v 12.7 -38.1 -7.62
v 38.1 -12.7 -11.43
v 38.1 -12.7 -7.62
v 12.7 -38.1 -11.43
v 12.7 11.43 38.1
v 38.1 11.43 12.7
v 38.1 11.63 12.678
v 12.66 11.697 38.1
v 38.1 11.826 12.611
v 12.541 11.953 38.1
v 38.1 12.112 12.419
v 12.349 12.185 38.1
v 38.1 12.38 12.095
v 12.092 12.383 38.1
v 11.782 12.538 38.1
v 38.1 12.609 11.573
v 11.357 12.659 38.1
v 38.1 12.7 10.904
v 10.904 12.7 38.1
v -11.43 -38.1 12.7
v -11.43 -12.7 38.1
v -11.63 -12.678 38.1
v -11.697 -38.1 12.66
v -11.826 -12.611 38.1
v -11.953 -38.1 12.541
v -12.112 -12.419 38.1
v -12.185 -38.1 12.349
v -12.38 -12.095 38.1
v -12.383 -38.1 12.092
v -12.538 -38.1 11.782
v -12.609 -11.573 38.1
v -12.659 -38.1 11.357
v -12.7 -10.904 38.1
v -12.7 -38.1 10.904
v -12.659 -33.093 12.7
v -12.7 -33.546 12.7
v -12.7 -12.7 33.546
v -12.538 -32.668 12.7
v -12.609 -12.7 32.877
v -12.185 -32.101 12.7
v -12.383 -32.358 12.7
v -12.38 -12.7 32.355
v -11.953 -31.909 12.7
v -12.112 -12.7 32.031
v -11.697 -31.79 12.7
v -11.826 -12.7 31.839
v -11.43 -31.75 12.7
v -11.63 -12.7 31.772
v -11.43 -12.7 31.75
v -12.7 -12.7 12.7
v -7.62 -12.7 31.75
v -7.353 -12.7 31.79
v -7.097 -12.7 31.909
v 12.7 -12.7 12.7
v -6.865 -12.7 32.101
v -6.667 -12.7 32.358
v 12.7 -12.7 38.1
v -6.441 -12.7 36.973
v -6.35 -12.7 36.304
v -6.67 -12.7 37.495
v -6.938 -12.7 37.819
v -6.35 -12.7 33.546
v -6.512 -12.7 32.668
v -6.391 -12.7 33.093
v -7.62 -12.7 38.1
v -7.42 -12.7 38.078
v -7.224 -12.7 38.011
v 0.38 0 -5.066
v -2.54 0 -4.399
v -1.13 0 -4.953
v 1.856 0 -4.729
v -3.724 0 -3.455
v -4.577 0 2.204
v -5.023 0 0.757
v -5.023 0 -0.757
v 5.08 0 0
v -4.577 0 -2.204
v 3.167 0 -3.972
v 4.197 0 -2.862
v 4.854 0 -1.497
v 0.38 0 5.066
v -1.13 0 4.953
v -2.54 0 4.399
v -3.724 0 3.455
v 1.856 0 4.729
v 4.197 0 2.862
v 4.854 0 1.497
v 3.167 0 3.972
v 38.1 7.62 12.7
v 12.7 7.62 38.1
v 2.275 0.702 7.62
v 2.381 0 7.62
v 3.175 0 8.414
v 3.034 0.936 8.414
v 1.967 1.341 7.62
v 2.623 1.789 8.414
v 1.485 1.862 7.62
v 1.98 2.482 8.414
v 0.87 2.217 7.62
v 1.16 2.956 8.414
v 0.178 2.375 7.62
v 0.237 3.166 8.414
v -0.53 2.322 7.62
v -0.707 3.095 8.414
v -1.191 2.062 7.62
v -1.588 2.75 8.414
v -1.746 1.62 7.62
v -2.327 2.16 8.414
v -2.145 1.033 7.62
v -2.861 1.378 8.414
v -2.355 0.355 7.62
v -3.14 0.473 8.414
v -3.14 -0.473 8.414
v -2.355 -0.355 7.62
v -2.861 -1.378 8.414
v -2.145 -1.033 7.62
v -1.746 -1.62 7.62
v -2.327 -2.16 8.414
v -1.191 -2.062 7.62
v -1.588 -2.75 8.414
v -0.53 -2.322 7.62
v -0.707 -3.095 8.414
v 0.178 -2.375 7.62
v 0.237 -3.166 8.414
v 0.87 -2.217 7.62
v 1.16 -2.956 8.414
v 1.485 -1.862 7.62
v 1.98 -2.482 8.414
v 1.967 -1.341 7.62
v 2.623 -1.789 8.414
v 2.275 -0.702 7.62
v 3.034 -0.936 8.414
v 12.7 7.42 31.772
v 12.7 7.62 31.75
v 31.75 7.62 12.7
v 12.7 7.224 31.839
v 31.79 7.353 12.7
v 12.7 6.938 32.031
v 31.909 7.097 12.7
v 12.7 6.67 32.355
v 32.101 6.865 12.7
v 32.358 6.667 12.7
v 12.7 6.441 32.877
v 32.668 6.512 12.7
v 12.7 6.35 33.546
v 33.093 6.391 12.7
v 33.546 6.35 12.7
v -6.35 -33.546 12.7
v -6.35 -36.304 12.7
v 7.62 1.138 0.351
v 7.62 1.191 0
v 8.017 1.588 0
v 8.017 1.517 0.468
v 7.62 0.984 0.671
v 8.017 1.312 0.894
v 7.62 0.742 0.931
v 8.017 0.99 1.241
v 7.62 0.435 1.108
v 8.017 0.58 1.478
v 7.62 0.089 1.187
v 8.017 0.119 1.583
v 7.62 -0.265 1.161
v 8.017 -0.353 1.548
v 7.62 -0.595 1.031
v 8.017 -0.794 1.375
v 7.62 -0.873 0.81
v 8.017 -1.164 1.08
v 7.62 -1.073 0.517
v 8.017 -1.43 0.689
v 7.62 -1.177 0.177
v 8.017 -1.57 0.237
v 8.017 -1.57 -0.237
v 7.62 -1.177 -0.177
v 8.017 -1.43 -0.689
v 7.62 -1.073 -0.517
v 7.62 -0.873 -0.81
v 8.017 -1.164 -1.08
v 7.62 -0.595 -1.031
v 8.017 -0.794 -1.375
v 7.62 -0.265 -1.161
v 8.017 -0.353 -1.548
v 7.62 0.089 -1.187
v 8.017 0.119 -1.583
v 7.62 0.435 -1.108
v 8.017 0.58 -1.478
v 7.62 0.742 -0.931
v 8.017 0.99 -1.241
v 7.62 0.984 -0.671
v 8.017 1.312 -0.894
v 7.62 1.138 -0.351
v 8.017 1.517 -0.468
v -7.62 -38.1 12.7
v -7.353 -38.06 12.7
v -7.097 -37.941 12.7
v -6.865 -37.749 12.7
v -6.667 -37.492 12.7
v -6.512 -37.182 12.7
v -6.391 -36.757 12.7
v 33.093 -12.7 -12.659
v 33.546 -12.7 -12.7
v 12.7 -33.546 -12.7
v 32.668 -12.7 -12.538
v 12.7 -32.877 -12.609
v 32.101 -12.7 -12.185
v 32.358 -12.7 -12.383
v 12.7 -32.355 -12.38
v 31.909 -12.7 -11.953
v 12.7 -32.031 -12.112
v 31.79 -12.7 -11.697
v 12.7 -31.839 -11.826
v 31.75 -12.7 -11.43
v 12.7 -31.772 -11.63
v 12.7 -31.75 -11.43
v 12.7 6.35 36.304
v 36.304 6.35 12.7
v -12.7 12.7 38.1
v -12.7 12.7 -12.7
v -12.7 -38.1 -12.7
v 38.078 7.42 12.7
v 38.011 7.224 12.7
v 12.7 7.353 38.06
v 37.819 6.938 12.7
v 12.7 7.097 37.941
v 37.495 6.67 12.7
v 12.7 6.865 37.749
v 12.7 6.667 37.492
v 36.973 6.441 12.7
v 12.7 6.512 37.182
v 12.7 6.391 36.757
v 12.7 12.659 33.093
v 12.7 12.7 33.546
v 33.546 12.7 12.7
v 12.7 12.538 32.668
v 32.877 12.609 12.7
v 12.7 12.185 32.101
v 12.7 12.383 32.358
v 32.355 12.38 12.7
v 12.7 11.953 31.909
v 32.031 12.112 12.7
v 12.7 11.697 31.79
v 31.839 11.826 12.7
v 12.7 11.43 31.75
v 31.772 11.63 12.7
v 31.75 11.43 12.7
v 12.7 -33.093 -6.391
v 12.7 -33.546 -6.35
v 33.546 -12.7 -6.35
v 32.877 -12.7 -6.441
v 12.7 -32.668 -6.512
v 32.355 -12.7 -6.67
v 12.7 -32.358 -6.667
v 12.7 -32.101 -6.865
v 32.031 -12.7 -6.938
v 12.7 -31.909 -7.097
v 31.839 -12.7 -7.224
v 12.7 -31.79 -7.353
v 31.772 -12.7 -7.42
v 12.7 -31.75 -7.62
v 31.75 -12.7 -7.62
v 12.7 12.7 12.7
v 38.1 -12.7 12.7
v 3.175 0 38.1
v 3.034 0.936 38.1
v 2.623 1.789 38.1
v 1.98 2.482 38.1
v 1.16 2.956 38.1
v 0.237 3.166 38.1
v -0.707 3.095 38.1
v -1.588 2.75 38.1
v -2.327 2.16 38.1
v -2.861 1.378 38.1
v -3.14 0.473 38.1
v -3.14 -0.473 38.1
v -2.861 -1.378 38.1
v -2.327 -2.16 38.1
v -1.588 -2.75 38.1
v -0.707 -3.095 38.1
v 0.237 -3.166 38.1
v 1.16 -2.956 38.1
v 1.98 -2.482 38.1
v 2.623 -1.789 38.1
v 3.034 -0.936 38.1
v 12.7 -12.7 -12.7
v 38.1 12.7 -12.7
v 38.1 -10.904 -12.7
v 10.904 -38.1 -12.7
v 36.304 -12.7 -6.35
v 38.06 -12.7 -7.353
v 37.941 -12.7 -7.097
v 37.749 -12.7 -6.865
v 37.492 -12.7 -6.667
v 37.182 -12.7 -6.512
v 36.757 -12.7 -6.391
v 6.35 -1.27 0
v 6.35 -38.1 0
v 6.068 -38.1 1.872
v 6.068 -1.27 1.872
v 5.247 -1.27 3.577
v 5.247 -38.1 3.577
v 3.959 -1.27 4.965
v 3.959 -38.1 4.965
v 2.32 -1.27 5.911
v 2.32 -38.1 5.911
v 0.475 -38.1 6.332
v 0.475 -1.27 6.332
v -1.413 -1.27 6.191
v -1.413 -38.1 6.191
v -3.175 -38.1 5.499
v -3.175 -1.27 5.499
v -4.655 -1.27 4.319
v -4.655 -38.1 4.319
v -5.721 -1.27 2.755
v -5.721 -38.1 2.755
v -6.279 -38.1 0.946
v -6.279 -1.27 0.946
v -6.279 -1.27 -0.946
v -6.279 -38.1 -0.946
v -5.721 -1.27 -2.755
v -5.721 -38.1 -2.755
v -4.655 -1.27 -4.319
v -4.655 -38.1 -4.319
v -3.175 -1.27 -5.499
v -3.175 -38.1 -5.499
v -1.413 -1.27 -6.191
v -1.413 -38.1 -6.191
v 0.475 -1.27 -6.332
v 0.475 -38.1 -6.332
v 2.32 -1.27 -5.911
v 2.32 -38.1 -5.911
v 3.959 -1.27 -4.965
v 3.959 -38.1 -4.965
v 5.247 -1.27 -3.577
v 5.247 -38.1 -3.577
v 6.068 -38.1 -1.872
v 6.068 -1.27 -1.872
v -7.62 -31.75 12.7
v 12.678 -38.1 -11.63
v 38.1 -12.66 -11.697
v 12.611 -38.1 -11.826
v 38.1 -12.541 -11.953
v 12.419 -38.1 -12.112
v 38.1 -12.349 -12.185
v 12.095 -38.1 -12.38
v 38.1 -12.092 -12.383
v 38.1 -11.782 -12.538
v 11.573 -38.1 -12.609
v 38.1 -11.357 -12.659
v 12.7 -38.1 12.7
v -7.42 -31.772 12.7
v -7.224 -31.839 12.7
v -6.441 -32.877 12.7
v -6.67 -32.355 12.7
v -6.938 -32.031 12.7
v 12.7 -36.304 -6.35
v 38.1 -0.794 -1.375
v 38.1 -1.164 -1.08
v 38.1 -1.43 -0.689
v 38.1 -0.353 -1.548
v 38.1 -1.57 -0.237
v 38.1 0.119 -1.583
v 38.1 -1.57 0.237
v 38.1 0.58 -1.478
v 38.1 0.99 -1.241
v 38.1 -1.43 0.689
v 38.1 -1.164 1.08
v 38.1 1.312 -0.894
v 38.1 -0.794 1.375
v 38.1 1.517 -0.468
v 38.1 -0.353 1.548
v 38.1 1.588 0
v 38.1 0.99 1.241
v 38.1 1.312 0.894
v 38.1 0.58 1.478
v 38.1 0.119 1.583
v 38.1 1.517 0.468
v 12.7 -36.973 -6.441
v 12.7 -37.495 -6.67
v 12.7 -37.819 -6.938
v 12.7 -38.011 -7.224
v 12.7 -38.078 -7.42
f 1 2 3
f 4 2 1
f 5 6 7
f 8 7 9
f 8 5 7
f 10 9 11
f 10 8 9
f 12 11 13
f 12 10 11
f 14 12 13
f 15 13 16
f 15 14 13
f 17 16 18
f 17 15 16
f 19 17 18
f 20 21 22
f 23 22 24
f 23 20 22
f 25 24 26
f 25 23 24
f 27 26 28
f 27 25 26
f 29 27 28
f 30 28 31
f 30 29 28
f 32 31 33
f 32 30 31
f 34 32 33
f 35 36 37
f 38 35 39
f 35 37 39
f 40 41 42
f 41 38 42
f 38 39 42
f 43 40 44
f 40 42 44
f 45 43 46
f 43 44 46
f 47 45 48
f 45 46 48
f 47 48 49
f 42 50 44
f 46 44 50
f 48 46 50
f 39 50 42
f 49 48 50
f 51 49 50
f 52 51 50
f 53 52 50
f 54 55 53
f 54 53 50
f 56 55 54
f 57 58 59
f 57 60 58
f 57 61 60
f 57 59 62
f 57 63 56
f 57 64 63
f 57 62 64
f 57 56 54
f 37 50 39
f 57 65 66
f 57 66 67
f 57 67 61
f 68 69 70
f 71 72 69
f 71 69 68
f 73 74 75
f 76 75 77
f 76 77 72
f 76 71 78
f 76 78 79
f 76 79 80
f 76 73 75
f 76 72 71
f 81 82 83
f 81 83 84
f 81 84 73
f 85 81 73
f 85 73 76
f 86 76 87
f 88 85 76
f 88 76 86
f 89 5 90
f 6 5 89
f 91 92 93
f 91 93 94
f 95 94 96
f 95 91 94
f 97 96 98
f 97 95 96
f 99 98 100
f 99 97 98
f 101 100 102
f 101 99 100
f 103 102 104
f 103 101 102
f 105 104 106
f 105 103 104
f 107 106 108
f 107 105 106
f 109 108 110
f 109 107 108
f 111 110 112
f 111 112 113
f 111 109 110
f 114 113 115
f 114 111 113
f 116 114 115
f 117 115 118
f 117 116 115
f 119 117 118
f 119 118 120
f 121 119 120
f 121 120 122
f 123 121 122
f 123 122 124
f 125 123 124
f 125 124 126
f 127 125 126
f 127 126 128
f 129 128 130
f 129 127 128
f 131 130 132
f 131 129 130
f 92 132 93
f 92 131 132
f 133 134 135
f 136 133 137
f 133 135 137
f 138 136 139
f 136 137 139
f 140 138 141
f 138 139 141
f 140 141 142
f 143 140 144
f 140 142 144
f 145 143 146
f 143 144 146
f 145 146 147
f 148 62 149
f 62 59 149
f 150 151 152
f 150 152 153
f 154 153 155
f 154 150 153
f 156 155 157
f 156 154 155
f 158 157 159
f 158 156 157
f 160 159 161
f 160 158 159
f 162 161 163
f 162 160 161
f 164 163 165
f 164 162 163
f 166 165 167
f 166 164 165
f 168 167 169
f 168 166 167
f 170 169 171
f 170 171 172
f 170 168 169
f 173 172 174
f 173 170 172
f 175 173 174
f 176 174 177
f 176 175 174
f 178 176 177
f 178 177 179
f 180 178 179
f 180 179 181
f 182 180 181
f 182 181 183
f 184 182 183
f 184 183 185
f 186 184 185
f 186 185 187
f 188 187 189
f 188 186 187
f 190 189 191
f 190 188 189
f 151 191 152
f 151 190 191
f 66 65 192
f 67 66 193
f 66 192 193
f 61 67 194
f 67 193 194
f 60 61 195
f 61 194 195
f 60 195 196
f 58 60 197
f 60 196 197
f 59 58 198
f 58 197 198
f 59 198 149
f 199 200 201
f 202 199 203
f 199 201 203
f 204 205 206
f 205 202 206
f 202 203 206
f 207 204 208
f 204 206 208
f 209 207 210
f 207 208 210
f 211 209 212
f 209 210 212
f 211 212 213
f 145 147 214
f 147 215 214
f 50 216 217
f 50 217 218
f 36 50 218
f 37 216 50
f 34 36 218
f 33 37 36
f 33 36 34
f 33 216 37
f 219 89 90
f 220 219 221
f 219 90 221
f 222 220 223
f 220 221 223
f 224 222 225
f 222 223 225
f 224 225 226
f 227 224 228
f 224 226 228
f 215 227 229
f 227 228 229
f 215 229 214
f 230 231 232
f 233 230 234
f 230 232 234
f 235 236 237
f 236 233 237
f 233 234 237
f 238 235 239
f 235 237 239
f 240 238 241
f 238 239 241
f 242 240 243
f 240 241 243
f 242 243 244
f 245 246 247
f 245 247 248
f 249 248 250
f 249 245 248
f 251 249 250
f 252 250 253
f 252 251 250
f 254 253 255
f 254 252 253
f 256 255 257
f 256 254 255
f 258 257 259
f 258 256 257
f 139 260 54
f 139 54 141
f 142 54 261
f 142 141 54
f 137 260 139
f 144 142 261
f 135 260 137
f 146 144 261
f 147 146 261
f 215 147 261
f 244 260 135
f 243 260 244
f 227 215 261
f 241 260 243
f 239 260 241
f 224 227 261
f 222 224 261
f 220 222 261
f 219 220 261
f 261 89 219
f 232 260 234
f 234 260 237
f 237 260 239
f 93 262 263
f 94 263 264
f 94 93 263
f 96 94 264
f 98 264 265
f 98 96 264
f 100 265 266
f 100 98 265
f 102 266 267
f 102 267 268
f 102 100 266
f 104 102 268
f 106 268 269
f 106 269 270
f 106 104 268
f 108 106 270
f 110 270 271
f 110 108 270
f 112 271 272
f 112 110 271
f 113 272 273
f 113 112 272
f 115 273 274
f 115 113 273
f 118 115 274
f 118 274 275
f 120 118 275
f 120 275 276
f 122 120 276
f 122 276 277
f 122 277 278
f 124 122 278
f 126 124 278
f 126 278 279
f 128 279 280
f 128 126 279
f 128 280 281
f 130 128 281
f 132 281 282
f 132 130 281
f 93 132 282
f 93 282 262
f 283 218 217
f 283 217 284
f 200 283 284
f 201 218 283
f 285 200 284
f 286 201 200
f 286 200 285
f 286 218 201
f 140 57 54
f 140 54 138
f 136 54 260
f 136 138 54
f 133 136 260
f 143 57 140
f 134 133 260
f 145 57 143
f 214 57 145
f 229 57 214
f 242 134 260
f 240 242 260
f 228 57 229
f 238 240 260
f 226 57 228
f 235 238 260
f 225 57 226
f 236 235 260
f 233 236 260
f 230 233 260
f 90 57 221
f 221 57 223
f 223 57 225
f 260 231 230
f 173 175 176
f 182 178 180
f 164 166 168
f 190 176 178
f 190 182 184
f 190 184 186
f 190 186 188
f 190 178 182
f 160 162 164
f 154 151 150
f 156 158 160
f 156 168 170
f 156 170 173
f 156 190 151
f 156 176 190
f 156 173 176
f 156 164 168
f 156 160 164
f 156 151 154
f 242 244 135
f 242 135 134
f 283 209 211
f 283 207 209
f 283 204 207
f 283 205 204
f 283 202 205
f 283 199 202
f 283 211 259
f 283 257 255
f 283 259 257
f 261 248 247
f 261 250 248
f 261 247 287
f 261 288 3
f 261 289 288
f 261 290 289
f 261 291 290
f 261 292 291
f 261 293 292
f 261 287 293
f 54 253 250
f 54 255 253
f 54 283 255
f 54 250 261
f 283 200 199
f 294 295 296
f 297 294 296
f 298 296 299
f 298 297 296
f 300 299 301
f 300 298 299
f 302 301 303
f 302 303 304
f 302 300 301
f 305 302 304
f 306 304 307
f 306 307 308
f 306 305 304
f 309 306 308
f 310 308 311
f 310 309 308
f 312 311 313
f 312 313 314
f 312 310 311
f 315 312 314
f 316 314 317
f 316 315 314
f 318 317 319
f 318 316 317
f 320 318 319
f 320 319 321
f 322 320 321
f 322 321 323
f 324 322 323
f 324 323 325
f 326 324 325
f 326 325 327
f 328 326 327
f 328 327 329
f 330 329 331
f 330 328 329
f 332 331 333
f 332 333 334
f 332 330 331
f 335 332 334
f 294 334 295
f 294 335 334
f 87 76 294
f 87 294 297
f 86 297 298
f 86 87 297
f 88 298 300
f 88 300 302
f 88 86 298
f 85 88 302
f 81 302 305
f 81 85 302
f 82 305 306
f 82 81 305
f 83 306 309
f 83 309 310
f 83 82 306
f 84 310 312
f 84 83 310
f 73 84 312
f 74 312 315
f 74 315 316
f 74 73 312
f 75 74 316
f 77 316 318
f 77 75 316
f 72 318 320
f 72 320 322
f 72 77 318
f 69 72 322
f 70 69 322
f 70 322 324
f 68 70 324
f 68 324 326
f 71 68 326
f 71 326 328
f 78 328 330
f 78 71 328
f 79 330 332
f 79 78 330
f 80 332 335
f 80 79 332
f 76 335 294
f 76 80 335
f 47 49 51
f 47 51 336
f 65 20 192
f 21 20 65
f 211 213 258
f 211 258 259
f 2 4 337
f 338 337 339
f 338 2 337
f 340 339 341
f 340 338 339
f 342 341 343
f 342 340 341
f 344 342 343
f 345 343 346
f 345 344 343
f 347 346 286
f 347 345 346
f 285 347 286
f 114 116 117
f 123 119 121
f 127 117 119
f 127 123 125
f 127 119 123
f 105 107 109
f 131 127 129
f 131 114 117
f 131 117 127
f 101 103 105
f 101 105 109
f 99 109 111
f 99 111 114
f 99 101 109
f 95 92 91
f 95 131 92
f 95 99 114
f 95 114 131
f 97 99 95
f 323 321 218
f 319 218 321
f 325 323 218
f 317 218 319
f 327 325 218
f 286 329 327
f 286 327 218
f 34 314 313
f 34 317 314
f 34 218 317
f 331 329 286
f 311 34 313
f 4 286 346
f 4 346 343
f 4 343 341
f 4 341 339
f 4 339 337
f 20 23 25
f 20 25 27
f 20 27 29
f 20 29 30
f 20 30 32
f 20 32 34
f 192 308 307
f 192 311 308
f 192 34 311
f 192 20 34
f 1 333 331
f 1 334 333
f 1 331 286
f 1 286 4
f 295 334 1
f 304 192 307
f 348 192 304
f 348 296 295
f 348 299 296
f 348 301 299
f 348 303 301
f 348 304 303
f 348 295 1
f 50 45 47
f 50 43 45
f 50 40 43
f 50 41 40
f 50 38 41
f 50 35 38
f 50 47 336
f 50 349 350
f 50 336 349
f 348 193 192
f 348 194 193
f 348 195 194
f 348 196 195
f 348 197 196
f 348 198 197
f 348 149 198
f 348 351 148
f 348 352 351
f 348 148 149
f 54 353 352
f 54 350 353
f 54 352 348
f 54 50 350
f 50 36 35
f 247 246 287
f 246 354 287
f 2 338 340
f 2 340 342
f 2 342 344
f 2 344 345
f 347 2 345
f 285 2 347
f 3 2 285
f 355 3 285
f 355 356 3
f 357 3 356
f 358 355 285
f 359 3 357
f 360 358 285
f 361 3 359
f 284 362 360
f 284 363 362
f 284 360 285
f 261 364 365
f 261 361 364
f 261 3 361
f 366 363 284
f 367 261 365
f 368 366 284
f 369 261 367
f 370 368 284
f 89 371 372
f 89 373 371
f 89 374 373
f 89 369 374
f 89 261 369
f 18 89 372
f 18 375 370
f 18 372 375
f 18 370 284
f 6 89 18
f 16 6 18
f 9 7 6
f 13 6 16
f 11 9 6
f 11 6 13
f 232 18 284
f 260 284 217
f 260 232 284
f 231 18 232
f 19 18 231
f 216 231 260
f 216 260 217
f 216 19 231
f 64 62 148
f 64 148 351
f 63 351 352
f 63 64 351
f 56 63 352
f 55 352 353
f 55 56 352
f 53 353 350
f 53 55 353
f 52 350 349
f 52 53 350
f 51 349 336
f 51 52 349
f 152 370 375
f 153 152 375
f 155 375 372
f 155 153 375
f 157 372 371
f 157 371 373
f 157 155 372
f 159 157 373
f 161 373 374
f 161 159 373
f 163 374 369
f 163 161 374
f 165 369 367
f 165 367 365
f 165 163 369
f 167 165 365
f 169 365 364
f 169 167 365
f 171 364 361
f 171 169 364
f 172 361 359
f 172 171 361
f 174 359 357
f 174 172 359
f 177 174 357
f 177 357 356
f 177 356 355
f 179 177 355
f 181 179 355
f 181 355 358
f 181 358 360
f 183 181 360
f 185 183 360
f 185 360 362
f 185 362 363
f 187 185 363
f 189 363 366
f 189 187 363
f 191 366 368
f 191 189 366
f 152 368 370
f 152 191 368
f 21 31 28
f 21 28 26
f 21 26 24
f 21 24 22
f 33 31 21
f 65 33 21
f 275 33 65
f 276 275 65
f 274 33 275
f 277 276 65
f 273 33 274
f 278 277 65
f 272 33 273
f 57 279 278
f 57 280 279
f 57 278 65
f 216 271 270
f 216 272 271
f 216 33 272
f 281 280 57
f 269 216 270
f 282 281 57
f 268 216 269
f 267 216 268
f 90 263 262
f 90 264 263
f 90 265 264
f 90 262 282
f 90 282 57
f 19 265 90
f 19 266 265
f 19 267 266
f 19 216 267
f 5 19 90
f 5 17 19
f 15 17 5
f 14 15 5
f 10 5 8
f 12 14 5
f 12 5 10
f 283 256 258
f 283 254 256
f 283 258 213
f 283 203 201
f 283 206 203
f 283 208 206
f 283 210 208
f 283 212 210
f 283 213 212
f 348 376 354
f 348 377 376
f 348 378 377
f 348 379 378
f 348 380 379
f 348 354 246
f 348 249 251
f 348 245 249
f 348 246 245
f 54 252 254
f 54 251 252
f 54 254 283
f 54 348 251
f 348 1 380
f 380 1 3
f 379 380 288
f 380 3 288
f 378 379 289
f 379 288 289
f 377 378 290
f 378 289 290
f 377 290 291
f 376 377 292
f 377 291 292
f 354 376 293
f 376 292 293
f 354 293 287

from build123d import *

# Parameters (mm, degrees)
F0_W          = 25.4
F0_H          = 25.4
F1_DEPTH      = 12.7
F2_R          = 3.175
F3_DEPTH      = 5.08
F4_R          = 1.5875
F5_DEPTH      = 5.08
F6_R          = 6.35
F7_DEPTH      = 12.7
F8_SIZE       = 1.27
F9_SIZE       = 0.396875
F10_SIZE      = 0.79375
F11_W         = 25.4
F11_H         = 25.4
F11_R         = 1.5875
F12_DEPTH     = 25.4
F13_W         = 25.4
F13_H         = 25.4
F13_R         = 6.35
F14_DEPTH     = 25.4
F15_W         = 25.4
F15_H         = 25.4
F15_R         = 3.175
F16_DEPTH     = 25.4
F18_DEPTH     = 6.35
F20_DEPTH     = 6.35
F22_DEPTH     = 6.35
F23_T1_DEPTH  = 42.2710244843
F23_T3_DEPTH  = 42.2710244843
F23_T5_DEPTH  = 42.2710244843
F23_T10_DEPTH = 42.2710244843
F23_T16_DEPTH = 33.2907683632
F23_T22_DEPTH = 33.2907683632
F23_T28_DEPTH = 42.2710244843
F23_T34_DEPTH = 33.2907683632
F23_T40_DEPTH = 33.2907683632
F23_T46_DEPTH = 42.2710244843
F23_T52_DEPTH = 33.2907683632
F23_T58_DEPTH = 33.2907683632


# Not quite as in the source:
# - a fillet or chamfer that OpenCascade refuses, or shapes differently, is made with other operations: its cross-section is extruded or revolved along the edge and cut away or added


with BuildPart() as f1:
    # F0 (on Top) → F1 (new body, symmetric)
    with BuildSketch(Plane.XY):
        Rectangle(F0_W, F0_H)
    extrude(amount=F1_DEPTH, both=True)

    # F2 (on face) → F3 (cut)
    with BuildSketch(Plane.XY.offset(12.7)):
        Circle(F2_R)
    extrude(amount=-F3_DEPTH, mode=Mode.SUBTRACT)

    # F4 (on face) → F5 (cut)
    with BuildSketch(Plane.YZ.offset(12.7)):
        Circle(F4_R)
    extrude(amount=-F5_DEPTH, mode=Mode.SUBTRACT)

    # F6 (on face) → F7 (cut)
    with BuildSketch(Plane.XZ.offset(12.7)):
        Circle(F6_R)
    extrude(amount=-F7_DEPTH, mode=Mode.SUBTRACT)

    # F8
    f8_edges = [f1.edges().sort_by_distance(p)[0] for p in [
        (-6.35, 0, 0),
    ]]
    chamfer(f8_edges, length=F8_SIZE)

    # F9
    f9_edges = [f1.edges().sort_by_distance(p)[0] for p in [
        (7.62, -1.5875, 0),
    ]]
    chamfer(f9_edges, length=F9_SIZE)

    # F10
    f10_edges = [f1.edges().sort_by_distance(p)[0] for p in [
        (-3.175, 0, 7.62),
    ]]
    chamfer(f10_edges, length=F10_SIZE)

    # F11 (on face) → F12 (join)
    with BuildSketch(Plane.YZ.offset(12.7)):
        Rectangle(F11_W, F11_H)
        Circle(F11_R, mode=Mode.SUBTRACT)
    extrude(amount=F12_DEPTH)

    # F13 (on face) → F14 (join)
    with BuildSketch(Plane.XZ.offset(12.7)):
        Rectangle(F13_W, F13_H)
        Circle(F13_R, mode=Mode.SUBTRACT)
    extrude(amount=F14_DEPTH)

    # F15 (on face) → F16 (join)
    with BuildSketch(Plane.XY.offset(12.7)):
        Rectangle(F15_W, F15_H)
        Circle(F15_R, mode=Mode.SUBTRACT)
    extrude(amount=F16_DEPTH)

    # F17 (on face) → F18 (join)
    with BuildSketch(Plane(origin=(0, 0, -12.7), x_dir=(1, 0, 0), z_dir=(0, 0, -1))):
        Polygon((38.1, 12.7), (12.7, 38.1), (12.7, 31.75), (31.75, 12.7), align=None)
    extrude(amount=-F18_DEPTH)

    # F19 (on face) → F20 (join)
    with BuildSketch(Plane(origin=(0, 12.7, 0), x_dir=(-1, 0, 0), z_dir=(0, 1, 0))):
        Polygon((-12.7, 38.1), (-38.1, 12.7), (-31.75, 12.7), (-12.7, 31.75), align=None)
    extrude(amount=-F20_DEPTH)

    # F21 (on face) → F22 (join)
    with BuildSketch(Plane(origin=(-12.7, 0, 0), x_dir=(0, -1, 0), z_dir=(-1, 0, 0))):
        Polygon((38.1, 12.7), (12.7, 38.1), (12.7, 31.75), (31.75, 12.7), align=None)
    extrude(amount=-F22_DEPTH)

    # F23: fillet of radius 1.27 on 12 edges, made by hand

    # F23_s2 → F23_t1 (cut)
    with BuildSketch(Plane(origin=(-14.9450640303, 0, 14.9450640303), x_dir=(0, 1, 0), z_dir=(0.7071067812, 0, -0.7071067812))):
        with BuildLine():
            ThreePointArc((11.43, 35.9210244843), (12.3280256121, 35.5490500964), (12.7, 34.6510244843))
            Line((12.7, 34.6510244843), (12.7, 35.9210244843))
            Line((12.7, 35.9210244843), (11.43, 35.9210244843))
        make_face()
    extrude(amount=F23_T1_DEPTH, mode=Mode.SUBTRACT)

    # F23_s4 → F23_t3 (cut)
    with BuildSketch(Plane(origin=(0, -14.9450640303, -14.9450640303), x_dir=(1, 0, 0), z_dir=(0, 0.7071067812, 0.7071067812))):
        with BuildLine():
            ThreePointArc((-11.43, -35.9210244843), (-12.3280256121, -35.5490500964), (-12.7, -34.6510244843))
            Line((-12.7, -34.6510244843), (-12.7, -35.9210244843))
            Line((-12.7, -35.9210244843), (-11.43, -35.9210244843))
        make_face()
    extrude(amount=F23_T3_DEPTH, mode=Mode.SUBTRACT)

    # F23_s6 → F23_t5 (cut)
    with BuildSketch(Plane(origin=(14.9450640303, 14.9450640303, 0), x_dir=(0, 0, 1), z_dir=(-0.7071067812, -0.7071067812, 0))):
        with BuildLine():
            ThreePointArc((-11.43, -35.9210244843), (-12.3280256121, -35.5490500964), (-12.7, -34.6510244843))
            Line((-12.7, -34.6510244843), (-12.7, -35.9210244843))
            Line((-12.7, -35.9210244843), (-11.43, -35.9210244843))
        make_face()
    extrude(amount=F23_T5_DEPTH, mode=Mode.SUBTRACT)


with BuildPart() as f23_tool8:
    # F23_s9 → F23_t10 (new body)
    with BuildSketch(Plane(origin=(-14.9450640303, 0, 14.9450640303), x_dir=(0, 1, 0), z_dir=(0.7071067812, 0, -0.7071067812))):
        with BuildLine():
            ThreePointArc((7.62, 35.9210244843), (6.7219743879, 35.5490500964), (6.35, 34.6510244843))
            Line((6.35, 34.6510244843), (6.35, 35.9210244843))
            Line((6.35, 35.9210244843), (7.62, 35.9210244843))
        make_face()
    extrude(amount=F23_T10_DEPTH)

    split(bisect_by=Plane.YZ.offset(12.7), keep=Keep.TOP)

    split(bisect_by=Plane.XY.offset(12.7), keep=Keep.TOP)


with BuildPart() as f1_1:
    add(f1.part)

    # F23_t7: cut F23_tool8
    add(f23_tool8.part, mode=Mode.SUBTRACT)


with BuildPart() as f23_tool14:
    # F23_s15 → F23_t16 (new body)
    with BuildSketch(Plane(origin=(11.7700640303, 0, -11.7700640303), x_dir=(0, 1, 0), z_dir=(-0.7071067812, 0, 0.7071067812))):
        with BuildLine():
            ThreePointArc((12.7, -32.7008964237), (12.3280256121, -31.8028708116), (11.43, -31.4308964237))
            Line((11.43, -31.4308964237), (12.7, -31.4308964237))
            Line((12.7, -31.4308964237), (12.7, -32.7008964237))
        make_face()
    extrude(amount=F23_T16_DEPTH)

    split(bisect_by=Plane.YZ.offset(12.7), keep=Keep.TOP)

    split(bisect_by=Plane.XY.offset(12.7), keep=Keep.TOP)


with BuildPart() as f1_2:
    add(f1_1.part)

    # F23_t13: cut F23_tool14
    add(f23_tool14.part, mode=Mode.SUBTRACT)


with BuildPart() as f23_tool20:
    # F23_s21 → F23_t22 (new body)
    with BuildSketch(Plane(origin=(11.7700640303, 0, -11.7700640303), x_dir=(0, 1, 0), z_dir=(-0.7071067812, 0, 0.7071067812))):
        with BuildLine():
            ThreePointArc((7.62, -31.4308964237), (6.7219743879, -31.8028708116), (6.35, -32.7008964237))
            Line((6.35, -32.7008964237), (6.35, -31.4308964237))
            Line((6.35, -31.4308964237), (7.62, -31.4308964237))
        make_face()
    extrude(amount=F23_T22_DEPTH)

    split(bisect_by=Plane.YZ.offset(12.7), keep=Keep.TOP)

    split(bisect_by=Plane.XY.offset(12.7), keep=Keep.TOP)


with BuildPart() as f1_3:
    add(f1_2.part)

    # F23_t19: cut F23_tool20
    add(f23_tool20.part, mode=Mode.SUBTRACT)


with BuildPart() as f23_tool26:
    # F23_s27 → F23_t28 (new body)
    with BuildSketch(Plane(origin=(0, -14.9450640303, -14.9450640303), x_dir=(1, 0, 0), z_dir=(0, 0.7071067812, 0.7071067812))):
        with BuildLine():
            ThreePointArc((-7.62, -35.9210244843), (-6.7219743879, -35.5490500964), (-6.35, -34.6510244843))
            Line((-6.35, -34.6510244843), (-6.35, -35.9210244843))
            Line((-6.35, -35.9210244843), (-7.62, -35.9210244843))
        make_face()
    extrude(amount=F23_T28_DEPTH)

    split(bisect_by=Plane.XZ.offset(12.7), keep=Keep.TOP)

    split(bisect_by=Plane.XY.offset(12.7), keep=Keep.TOP)


with BuildPart() as f1_4:
    add(f1_3.part)

    # F23_t25: cut F23_tool26
    add(f23_tool26.part, mode=Mode.SUBTRACT)


with BuildPart() as f23_tool32:
    # F23_s33 → F23_t34 (new body)
    with BuildSketch(Plane(origin=(0, 11.7700640303, 11.7700640303), x_dir=(1, 0, 0), z_dir=(0, -0.7071067812, -0.7071067812))):
        with BuildLine():
            ThreePointArc((-6.35, 32.7008964237), (-6.7219743879, 31.8028708116), (-7.62, 31.4308964237))
            Line((-7.62, 31.4308964237), (-6.35, 31.4308964237))
            Line((-6.35, 31.4308964237), (-6.35, 32.7008964237))
        make_face()
    extrude(amount=F23_T34_DEPTH)

    split(bisect_by=Plane.XZ.offset(12.7), keep=Keep.TOP)

    split(bisect_by=Plane.XY.offset(12.7), keep=Keep.TOP)


with BuildPart() as f1_5:
    add(f1_4.part)

    # F23_t31: cut F23_tool32
    add(f23_tool32.part, mode=Mode.SUBTRACT)


with BuildPart() as f23_tool38:
    # F23_s39 → F23_t40 (new body)
    with BuildSketch(Plane(origin=(0, 11.7700640303, 11.7700640303), x_dir=(1, 0, 0), z_dir=(0, -0.7071067812, -0.7071067812))):
        with BuildLine():
            ThreePointArc((-12.7, 32.7008964237), (-12.3280256121, 31.8028708116), (-11.43, 31.4308964237))
            Line((-11.43, 31.4308964237), (-12.7, 31.4308964237))
            Line((-12.7, 31.4308964237), (-12.7, 32.7008964237))
        make_face()
    extrude(amount=F23_T40_DEPTH)

    split(bisect_by=Plane.XZ.offset(12.7), keep=Keep.TOP)

    split(bisect_by=Plane.XY.offset(12.7), keep=Keep.TOP)


with BuildPart() as f1_6:
    add(f1_5.part)

    # F23_t37: cut F23_tool38
    add(f23_tool38.part, mode=Mode.SUBTRACT)


with BuildPart() as f23_tool44:
    # F23_s45 → F23_t46 (new body)
    with BuildSketch(Plane(origin=(14.9450640303, 14.9450640303, 0), x_dir=(0, 0, 1), z_dir=(-0.7071067812, -0.7071067812, 0))):
        with BuildLine():
            ThreePointArc((-7.62, -35.9210244843), (-6.7219743879, -35.5490500964), (-6.35, -34.6510244843))
            Line((-6.35, -34.6510244843), (-6.35, -35.9210244843))
            Line((-6.35, -35.9210244843), (-7.62, -35.9210244843))
        make_face()
    extrude(amount=F23_T46_DEPTH)

    split(bisect_by=Plane.YZ.offset(12.7), keep=Keep.TOP)

    split(bisect_by=Plane.XZ.offset(12.7), keep=Keep.TOP)


with BuildPart() as f1_7:
    add(f1_6.part)

    # F23_t43: cut F23_tool44
    add(f23_tool44.part, mode=Mode.SUBTRACT)


with BuildPart() as f23_tool50:
    # F23_s51 → F23_t52 (new body)
    with BuildSketch(Plane(origin=(-11.7700640303, -11.7700640303, 0), x_dir=(0, 0, 1), z_dir=(0.7071067812, 0.7071067812, 0))):
        with BuildLine():
            ThreePointArc((-12.7, 32.7008964237), (-12.3280256121, 31.8028708116), (-11.43, 31.4308964237))
            Line((-11.43, 31.4308964237), (-12.7, 31.4308964237))
            Line((-12.7, 31.4308964237), (-12.7, 32.7008964237))
        make_face()
    extrude(amount=F23_T52_DEPTH)

    split(bisect_by=Plane.YZ.offset(12.7), keep=Keep.TOP)

    split(bisect_by=Plane.XZ.offset(12.7), keep=Keep.TOP)


with BuildPart() as f1_8:
    add(f1_7.part)

    # F23_t49: cut F23_tool50
    add(f23_tool50.part, mode=Mode.SUBTRACT)


with BuildPart() as f23_tool56:
    # F23_s57 → F23_t58 (new body)
    with BuildSketch(Plane(origin=(-11.7700640303, -11.7700640303, 0), x_dir=(0, 0, 1), z_dir=(0.7071067812, 0.7071067812, 0))):
        with BuildLine():
            ThreePointArc((-6.35, 32.7008964237), (-6.7219743879, 31.8028708116), (-7.62, 31.4308964237))
            Line((-7.62, 31.4308964237), (-6.35, 31.4308964237))
            Line((-6.35, 31.4308964237), (-6.35, 32.7008964237))
        make_face()
    extrude(amount=F23_T58_DEPTH)

    split(bisect_by=Plane.YZ.offset(12.7), keep=Keep.TOP)

    split(bisect_by=Plane.XZ.offset(12.7), keep=Keep.TOP)


with BuildPart() as f1_9:
    add(f1_8.part)

    # F23_t55: cut F23_tool56
    add(f23_tool56.part, mode=Mode.SUBTRACT)


solid = f1_9.part
